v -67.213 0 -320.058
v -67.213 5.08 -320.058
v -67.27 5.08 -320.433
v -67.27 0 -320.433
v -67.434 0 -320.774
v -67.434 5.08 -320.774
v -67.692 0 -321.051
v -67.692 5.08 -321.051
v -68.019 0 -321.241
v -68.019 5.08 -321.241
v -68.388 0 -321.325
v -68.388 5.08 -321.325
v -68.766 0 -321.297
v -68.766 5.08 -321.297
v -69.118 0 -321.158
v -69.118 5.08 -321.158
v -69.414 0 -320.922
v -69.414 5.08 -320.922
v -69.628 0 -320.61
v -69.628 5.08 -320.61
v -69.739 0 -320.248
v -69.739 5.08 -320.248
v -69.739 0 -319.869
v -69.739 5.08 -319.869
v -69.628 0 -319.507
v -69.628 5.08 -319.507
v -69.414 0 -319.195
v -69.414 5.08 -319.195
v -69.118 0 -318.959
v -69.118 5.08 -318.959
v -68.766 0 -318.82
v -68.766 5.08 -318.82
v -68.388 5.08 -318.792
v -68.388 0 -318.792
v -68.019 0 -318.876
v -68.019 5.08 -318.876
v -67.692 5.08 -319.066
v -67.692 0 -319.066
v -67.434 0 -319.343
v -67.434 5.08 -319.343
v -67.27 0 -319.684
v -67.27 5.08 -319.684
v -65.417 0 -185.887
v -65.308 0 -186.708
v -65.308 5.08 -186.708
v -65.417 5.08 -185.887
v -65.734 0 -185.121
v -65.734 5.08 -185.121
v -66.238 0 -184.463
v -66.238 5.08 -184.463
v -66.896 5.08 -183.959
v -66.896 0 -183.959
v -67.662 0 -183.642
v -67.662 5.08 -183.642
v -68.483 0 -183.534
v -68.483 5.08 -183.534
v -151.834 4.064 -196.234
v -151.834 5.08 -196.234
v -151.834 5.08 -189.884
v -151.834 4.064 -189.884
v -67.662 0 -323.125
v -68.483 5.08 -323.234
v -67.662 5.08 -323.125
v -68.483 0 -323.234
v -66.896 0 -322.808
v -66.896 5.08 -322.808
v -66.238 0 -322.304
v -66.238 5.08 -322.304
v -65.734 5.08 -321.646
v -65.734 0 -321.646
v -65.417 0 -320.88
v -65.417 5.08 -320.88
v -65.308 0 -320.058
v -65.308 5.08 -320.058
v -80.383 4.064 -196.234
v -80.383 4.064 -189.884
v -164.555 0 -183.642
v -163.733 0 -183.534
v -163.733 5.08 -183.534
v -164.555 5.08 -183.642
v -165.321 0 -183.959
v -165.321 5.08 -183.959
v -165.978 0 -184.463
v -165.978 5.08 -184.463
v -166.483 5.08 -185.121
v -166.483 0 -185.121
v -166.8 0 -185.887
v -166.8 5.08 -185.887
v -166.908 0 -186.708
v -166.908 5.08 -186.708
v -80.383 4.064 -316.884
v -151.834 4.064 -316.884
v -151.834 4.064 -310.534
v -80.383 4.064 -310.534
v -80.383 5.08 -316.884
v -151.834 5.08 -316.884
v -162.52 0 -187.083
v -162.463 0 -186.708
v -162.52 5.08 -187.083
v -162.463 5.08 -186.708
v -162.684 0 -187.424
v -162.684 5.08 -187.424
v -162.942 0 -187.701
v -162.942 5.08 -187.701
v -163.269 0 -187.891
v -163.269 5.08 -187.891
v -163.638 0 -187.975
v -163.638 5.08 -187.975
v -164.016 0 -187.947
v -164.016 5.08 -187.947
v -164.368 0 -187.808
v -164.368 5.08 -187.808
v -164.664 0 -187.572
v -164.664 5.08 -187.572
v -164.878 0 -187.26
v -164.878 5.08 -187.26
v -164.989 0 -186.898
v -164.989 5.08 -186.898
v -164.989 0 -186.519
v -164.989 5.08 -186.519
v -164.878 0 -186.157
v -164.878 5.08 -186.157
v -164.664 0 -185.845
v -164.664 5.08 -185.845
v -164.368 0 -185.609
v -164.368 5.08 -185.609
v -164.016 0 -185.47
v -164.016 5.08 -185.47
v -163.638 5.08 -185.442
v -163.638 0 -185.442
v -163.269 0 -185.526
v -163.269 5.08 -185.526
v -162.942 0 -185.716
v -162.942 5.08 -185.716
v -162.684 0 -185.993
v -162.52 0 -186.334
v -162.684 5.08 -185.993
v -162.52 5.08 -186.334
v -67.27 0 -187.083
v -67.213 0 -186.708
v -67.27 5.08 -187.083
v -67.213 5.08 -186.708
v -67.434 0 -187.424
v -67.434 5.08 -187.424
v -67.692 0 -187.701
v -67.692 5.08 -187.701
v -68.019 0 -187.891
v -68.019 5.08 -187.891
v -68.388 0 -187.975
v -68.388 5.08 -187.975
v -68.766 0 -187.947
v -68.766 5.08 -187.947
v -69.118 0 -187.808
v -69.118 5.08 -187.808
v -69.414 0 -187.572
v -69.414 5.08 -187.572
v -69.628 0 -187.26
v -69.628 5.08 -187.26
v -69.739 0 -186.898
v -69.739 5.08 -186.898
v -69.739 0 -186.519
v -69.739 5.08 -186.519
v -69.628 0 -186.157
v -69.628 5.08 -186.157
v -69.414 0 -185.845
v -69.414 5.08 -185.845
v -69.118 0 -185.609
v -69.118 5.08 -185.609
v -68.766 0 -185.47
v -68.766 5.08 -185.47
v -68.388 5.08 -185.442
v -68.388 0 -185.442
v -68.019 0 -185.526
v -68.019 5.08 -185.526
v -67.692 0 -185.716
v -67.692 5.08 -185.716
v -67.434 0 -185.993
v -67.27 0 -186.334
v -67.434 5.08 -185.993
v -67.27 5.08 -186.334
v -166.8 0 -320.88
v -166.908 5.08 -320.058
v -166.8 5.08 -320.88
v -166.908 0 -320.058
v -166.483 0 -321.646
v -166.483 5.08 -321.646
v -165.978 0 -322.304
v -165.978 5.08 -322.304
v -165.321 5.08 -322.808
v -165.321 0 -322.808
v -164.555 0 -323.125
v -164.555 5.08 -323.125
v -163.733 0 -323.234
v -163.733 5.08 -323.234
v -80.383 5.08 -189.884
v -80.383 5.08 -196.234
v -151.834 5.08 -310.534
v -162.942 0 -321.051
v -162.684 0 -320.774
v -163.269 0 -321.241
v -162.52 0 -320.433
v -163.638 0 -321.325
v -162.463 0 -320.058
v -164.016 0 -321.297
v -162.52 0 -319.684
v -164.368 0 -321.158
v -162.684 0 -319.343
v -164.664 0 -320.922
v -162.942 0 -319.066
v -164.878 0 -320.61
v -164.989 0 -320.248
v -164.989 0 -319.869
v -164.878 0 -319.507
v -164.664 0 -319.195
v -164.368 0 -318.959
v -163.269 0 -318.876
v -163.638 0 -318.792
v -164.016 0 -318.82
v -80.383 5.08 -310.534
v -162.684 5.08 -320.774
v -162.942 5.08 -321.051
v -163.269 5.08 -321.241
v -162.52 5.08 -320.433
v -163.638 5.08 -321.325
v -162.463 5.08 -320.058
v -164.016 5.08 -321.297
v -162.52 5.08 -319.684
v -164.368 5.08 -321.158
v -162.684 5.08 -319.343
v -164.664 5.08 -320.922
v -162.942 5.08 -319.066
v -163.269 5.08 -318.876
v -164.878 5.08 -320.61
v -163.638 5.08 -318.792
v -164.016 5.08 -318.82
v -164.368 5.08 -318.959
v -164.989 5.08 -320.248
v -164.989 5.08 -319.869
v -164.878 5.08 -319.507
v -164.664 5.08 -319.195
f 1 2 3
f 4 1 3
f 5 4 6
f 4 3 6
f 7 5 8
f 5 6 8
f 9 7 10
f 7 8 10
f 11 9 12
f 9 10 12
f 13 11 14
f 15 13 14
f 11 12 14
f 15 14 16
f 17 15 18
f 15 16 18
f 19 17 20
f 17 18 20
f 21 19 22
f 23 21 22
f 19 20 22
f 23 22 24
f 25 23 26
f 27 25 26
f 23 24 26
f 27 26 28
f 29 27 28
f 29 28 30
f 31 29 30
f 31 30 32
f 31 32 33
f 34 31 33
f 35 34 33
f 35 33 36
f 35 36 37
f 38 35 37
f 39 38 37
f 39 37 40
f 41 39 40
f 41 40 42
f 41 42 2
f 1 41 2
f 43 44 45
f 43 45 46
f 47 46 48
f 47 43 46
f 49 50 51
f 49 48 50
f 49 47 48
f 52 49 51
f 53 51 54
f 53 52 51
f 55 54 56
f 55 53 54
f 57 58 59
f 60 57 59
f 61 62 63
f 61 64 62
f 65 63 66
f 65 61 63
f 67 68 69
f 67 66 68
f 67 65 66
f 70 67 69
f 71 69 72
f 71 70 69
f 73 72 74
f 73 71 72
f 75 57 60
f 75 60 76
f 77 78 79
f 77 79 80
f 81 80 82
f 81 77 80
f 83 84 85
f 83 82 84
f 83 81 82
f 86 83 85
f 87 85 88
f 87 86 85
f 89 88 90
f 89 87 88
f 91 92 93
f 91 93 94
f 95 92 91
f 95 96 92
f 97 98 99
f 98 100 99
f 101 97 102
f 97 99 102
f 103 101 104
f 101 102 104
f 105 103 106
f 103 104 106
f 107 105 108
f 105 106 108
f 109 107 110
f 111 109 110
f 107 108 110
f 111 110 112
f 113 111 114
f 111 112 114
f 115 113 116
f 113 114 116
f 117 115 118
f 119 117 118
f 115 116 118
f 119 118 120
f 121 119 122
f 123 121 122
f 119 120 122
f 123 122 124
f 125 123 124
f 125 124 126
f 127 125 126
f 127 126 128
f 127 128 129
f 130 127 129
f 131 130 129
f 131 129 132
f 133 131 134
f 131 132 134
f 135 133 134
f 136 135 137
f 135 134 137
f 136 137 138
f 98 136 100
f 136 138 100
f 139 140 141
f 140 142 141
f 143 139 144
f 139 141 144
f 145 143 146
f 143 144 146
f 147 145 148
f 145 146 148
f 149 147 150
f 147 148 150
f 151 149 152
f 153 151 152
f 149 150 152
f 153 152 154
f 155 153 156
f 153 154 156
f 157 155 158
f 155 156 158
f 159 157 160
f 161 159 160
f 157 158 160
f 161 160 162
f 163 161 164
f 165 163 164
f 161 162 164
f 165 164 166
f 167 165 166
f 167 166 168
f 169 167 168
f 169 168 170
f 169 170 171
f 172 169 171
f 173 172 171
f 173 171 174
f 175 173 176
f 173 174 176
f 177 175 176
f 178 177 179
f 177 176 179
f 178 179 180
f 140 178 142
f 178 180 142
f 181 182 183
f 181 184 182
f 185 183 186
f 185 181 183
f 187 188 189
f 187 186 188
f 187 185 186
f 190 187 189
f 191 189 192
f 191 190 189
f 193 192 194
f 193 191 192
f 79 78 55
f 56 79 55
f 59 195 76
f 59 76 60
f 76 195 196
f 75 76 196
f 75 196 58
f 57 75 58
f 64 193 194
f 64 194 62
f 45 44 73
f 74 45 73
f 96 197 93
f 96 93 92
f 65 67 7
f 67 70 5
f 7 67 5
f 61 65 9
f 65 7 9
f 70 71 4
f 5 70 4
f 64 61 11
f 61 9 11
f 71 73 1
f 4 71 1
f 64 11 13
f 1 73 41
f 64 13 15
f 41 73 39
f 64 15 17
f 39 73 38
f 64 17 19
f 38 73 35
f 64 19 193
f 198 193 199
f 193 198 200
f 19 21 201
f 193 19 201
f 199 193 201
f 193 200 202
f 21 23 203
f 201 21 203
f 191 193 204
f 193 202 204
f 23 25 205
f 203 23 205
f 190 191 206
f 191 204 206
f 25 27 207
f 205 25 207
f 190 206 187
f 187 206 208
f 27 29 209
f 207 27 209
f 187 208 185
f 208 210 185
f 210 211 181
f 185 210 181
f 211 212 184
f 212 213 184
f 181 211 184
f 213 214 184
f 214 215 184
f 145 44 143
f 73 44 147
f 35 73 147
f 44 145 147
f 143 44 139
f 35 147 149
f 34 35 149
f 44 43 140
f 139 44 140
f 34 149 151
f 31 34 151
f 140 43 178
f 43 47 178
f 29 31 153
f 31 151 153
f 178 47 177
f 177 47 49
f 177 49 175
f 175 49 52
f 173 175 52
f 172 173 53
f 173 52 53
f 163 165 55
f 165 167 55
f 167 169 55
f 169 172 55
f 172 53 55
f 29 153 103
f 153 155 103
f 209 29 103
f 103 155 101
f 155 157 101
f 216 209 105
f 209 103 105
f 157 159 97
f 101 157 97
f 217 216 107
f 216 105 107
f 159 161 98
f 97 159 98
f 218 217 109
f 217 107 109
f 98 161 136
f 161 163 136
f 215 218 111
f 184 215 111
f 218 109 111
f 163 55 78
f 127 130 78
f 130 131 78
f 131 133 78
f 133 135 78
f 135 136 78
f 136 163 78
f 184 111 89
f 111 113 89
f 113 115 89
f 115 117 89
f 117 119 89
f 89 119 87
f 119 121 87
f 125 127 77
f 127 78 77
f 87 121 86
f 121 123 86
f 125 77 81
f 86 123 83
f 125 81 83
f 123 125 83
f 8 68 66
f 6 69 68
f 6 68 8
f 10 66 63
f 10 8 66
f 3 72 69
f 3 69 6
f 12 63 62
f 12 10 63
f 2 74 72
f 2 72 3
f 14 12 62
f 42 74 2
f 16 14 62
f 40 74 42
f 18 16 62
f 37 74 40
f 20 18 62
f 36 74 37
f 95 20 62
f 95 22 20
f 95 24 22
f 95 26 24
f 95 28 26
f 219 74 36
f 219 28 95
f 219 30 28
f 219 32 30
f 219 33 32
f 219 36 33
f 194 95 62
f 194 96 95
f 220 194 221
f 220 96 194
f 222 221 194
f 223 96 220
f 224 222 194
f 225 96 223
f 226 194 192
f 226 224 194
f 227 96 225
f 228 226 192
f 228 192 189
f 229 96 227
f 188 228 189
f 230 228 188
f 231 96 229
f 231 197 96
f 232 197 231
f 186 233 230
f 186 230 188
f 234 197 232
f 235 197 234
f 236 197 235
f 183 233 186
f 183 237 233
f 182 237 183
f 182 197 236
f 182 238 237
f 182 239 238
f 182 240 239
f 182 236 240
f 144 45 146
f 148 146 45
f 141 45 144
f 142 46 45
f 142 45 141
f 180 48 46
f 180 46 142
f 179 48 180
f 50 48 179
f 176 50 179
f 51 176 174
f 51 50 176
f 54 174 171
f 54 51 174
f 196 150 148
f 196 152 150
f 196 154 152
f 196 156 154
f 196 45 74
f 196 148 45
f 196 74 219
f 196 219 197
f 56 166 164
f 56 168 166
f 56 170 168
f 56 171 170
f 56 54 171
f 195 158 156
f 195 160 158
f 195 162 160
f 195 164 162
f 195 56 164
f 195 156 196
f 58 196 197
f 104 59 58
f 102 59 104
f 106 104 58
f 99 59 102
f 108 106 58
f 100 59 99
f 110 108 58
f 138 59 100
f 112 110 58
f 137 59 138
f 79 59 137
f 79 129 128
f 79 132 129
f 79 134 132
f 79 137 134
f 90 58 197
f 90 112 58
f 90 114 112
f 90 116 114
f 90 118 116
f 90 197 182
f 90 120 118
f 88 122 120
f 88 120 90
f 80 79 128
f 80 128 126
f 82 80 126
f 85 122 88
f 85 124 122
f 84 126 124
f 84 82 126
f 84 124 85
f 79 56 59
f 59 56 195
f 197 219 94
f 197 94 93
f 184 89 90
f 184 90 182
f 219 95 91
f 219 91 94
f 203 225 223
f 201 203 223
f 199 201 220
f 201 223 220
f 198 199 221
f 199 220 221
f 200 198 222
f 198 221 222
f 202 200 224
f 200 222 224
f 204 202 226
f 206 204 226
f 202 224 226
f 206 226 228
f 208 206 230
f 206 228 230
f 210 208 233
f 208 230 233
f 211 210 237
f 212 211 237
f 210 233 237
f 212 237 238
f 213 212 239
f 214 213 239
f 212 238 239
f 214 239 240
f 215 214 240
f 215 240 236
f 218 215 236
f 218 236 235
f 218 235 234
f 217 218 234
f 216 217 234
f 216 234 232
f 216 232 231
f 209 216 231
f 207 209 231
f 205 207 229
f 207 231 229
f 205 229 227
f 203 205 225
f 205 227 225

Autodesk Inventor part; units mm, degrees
ref_plane "YZ Plane" through (0, 0, 0) normal (1, 0, 0) x (0, 1, 0)
ref_plane "XZ Plane" through (0, 0, 0) normal (0, 1, 0) x (-1, 0, 0)
ref_plane "XY Plane" through (0, 0, 0) normal (0, 0, 1) x (1, 0, 0)
sketch "Sketch1" plane through (0, 0, 0) normal (0, 1, 0) x (-1, 0, 0)
  line L0 (163.7334, -183.5335) -> (68.4834, -183.5335)
  line L1 (166.9084, -186.7085) -> (166.9084, -253.3835)
  line L2 (65.3084, -186.7085) -> (65.3084, -253.3835)
  arc A0 (166.9084, -186.7085) -> (163.7334, -183.5335) centre (163.7334, -186.7085) ccw
  arc A1 (68.4834, -183.5335) -> (65.3084, -186.7085) centre (68.4834, -186.7085) ccw
  line L3 (163.7334, -323.2335) -> (68.4834, -323.2335)
  line L4 (166.9084, -320.0585) -> (166.9084, -253.3835)
  line L5 (65.3084, -320.0585) -> (65.3084, -253.3835)
  arc A2 (163.7334, -323.2335) -> (166.9084, -320.0585) centre (163.7334, -320.0585) ccw
  arc A3 (65.3084, -320.0585) -> (68.4834, -323.2335) centre (68.4834, -320.0585) ccw
  point P0 (0, 0)
  point P1 (65.3084, -183.5335)
  dimension "d5" = 69.85
  dimension "d6" = 3.175
extrude "Extrusion1" add sketch "Sketch1" along normal blind 5.08
sketch "Sketch2" plane through (0, 5.08, 0) normal (0, 1, 0) x (1, 0, 0)
  arc A0 (-166.9084, 186.7085) -> (-163.7334, 183.5335) centre (-163.7334, 186.7085) ccw projected
  circle A1 centre (-163.7334, 186.7085) radius 1.27
  arc A2 (-68.4834, 183.5335) -> (-65.3084, 186.7085) centre (-68.4834, 186.7085) ccw projected
  circle A3 centre (-68.4834, 186.7085) radius 1.27
  arc A4 (-163.7334, 323.2335) -> (-166.9084, 320.0585) centre (-163.7334, 320.0585) ccw projected
  circle A5 centre (-163.7334, 320.0585) radius 1.27
  arc A6 (-65.3084, 320.0585) -> (-68.4834, 323.2335) centre (-68.4834, 320.0585) ccw projected
  circle A7 centre (-68.4834, 320.0585) radius 1.27
  point P0 (0, 0)
  dimension "d11" = 2.54
  dimension "d12" = 2.54
  dimension "d13" = 2.54
  dimension "d14" = 2.54
extrude "Extrusion2" cut sketch "Sketch2" against normal mid plane 25.4
sketch "Sketch3" plane through (0, 5.08, 0) normal (0, 1, 0) x (1, 0, 0)
  line L0 (-68.4834, 323.2335) -> (-163.7334, 323.2335) projected
  line L1 (-116.1084, 316.8835) -> (-80.3833, 316.8835)
  line L2 (-116.1084, 316.8835) -> (-151.8335, 316.8835)
  line L3 (-80.3833, 316.8835) -> (-80.3833, 310.5335)
  line L4 (-80.3833, 310.5335) -> (-151.8335, 310.5335)
  line L5 (-151.8335, 310.5335) -> (-151.8335, 316.8835)
  line L6 (-65.3084, 186.7085) -> (-65.3084, 320.0585) projected
  line L7 (-116.1084, 189.8835) -> (-80.3833, 189.8835)
  line L8 (-116.1084, 189.8835) -> (-151.8335, 189.8835)
  line L9 (-80.3833, 189.8835) -> (-80.3833, 196.2335)
  line L10 (-80.3833, 196.2335) -> (-151.8335, 196.2335)
  line L11 (-151.8335, 196.2335) -> (-151.8335, 189.8835)
  point P0 (0, 0)
extrude "Extrusion3" cut sketch "Sketch3" against normal blind 1.016
properties part number "Base Bracket 1x"
